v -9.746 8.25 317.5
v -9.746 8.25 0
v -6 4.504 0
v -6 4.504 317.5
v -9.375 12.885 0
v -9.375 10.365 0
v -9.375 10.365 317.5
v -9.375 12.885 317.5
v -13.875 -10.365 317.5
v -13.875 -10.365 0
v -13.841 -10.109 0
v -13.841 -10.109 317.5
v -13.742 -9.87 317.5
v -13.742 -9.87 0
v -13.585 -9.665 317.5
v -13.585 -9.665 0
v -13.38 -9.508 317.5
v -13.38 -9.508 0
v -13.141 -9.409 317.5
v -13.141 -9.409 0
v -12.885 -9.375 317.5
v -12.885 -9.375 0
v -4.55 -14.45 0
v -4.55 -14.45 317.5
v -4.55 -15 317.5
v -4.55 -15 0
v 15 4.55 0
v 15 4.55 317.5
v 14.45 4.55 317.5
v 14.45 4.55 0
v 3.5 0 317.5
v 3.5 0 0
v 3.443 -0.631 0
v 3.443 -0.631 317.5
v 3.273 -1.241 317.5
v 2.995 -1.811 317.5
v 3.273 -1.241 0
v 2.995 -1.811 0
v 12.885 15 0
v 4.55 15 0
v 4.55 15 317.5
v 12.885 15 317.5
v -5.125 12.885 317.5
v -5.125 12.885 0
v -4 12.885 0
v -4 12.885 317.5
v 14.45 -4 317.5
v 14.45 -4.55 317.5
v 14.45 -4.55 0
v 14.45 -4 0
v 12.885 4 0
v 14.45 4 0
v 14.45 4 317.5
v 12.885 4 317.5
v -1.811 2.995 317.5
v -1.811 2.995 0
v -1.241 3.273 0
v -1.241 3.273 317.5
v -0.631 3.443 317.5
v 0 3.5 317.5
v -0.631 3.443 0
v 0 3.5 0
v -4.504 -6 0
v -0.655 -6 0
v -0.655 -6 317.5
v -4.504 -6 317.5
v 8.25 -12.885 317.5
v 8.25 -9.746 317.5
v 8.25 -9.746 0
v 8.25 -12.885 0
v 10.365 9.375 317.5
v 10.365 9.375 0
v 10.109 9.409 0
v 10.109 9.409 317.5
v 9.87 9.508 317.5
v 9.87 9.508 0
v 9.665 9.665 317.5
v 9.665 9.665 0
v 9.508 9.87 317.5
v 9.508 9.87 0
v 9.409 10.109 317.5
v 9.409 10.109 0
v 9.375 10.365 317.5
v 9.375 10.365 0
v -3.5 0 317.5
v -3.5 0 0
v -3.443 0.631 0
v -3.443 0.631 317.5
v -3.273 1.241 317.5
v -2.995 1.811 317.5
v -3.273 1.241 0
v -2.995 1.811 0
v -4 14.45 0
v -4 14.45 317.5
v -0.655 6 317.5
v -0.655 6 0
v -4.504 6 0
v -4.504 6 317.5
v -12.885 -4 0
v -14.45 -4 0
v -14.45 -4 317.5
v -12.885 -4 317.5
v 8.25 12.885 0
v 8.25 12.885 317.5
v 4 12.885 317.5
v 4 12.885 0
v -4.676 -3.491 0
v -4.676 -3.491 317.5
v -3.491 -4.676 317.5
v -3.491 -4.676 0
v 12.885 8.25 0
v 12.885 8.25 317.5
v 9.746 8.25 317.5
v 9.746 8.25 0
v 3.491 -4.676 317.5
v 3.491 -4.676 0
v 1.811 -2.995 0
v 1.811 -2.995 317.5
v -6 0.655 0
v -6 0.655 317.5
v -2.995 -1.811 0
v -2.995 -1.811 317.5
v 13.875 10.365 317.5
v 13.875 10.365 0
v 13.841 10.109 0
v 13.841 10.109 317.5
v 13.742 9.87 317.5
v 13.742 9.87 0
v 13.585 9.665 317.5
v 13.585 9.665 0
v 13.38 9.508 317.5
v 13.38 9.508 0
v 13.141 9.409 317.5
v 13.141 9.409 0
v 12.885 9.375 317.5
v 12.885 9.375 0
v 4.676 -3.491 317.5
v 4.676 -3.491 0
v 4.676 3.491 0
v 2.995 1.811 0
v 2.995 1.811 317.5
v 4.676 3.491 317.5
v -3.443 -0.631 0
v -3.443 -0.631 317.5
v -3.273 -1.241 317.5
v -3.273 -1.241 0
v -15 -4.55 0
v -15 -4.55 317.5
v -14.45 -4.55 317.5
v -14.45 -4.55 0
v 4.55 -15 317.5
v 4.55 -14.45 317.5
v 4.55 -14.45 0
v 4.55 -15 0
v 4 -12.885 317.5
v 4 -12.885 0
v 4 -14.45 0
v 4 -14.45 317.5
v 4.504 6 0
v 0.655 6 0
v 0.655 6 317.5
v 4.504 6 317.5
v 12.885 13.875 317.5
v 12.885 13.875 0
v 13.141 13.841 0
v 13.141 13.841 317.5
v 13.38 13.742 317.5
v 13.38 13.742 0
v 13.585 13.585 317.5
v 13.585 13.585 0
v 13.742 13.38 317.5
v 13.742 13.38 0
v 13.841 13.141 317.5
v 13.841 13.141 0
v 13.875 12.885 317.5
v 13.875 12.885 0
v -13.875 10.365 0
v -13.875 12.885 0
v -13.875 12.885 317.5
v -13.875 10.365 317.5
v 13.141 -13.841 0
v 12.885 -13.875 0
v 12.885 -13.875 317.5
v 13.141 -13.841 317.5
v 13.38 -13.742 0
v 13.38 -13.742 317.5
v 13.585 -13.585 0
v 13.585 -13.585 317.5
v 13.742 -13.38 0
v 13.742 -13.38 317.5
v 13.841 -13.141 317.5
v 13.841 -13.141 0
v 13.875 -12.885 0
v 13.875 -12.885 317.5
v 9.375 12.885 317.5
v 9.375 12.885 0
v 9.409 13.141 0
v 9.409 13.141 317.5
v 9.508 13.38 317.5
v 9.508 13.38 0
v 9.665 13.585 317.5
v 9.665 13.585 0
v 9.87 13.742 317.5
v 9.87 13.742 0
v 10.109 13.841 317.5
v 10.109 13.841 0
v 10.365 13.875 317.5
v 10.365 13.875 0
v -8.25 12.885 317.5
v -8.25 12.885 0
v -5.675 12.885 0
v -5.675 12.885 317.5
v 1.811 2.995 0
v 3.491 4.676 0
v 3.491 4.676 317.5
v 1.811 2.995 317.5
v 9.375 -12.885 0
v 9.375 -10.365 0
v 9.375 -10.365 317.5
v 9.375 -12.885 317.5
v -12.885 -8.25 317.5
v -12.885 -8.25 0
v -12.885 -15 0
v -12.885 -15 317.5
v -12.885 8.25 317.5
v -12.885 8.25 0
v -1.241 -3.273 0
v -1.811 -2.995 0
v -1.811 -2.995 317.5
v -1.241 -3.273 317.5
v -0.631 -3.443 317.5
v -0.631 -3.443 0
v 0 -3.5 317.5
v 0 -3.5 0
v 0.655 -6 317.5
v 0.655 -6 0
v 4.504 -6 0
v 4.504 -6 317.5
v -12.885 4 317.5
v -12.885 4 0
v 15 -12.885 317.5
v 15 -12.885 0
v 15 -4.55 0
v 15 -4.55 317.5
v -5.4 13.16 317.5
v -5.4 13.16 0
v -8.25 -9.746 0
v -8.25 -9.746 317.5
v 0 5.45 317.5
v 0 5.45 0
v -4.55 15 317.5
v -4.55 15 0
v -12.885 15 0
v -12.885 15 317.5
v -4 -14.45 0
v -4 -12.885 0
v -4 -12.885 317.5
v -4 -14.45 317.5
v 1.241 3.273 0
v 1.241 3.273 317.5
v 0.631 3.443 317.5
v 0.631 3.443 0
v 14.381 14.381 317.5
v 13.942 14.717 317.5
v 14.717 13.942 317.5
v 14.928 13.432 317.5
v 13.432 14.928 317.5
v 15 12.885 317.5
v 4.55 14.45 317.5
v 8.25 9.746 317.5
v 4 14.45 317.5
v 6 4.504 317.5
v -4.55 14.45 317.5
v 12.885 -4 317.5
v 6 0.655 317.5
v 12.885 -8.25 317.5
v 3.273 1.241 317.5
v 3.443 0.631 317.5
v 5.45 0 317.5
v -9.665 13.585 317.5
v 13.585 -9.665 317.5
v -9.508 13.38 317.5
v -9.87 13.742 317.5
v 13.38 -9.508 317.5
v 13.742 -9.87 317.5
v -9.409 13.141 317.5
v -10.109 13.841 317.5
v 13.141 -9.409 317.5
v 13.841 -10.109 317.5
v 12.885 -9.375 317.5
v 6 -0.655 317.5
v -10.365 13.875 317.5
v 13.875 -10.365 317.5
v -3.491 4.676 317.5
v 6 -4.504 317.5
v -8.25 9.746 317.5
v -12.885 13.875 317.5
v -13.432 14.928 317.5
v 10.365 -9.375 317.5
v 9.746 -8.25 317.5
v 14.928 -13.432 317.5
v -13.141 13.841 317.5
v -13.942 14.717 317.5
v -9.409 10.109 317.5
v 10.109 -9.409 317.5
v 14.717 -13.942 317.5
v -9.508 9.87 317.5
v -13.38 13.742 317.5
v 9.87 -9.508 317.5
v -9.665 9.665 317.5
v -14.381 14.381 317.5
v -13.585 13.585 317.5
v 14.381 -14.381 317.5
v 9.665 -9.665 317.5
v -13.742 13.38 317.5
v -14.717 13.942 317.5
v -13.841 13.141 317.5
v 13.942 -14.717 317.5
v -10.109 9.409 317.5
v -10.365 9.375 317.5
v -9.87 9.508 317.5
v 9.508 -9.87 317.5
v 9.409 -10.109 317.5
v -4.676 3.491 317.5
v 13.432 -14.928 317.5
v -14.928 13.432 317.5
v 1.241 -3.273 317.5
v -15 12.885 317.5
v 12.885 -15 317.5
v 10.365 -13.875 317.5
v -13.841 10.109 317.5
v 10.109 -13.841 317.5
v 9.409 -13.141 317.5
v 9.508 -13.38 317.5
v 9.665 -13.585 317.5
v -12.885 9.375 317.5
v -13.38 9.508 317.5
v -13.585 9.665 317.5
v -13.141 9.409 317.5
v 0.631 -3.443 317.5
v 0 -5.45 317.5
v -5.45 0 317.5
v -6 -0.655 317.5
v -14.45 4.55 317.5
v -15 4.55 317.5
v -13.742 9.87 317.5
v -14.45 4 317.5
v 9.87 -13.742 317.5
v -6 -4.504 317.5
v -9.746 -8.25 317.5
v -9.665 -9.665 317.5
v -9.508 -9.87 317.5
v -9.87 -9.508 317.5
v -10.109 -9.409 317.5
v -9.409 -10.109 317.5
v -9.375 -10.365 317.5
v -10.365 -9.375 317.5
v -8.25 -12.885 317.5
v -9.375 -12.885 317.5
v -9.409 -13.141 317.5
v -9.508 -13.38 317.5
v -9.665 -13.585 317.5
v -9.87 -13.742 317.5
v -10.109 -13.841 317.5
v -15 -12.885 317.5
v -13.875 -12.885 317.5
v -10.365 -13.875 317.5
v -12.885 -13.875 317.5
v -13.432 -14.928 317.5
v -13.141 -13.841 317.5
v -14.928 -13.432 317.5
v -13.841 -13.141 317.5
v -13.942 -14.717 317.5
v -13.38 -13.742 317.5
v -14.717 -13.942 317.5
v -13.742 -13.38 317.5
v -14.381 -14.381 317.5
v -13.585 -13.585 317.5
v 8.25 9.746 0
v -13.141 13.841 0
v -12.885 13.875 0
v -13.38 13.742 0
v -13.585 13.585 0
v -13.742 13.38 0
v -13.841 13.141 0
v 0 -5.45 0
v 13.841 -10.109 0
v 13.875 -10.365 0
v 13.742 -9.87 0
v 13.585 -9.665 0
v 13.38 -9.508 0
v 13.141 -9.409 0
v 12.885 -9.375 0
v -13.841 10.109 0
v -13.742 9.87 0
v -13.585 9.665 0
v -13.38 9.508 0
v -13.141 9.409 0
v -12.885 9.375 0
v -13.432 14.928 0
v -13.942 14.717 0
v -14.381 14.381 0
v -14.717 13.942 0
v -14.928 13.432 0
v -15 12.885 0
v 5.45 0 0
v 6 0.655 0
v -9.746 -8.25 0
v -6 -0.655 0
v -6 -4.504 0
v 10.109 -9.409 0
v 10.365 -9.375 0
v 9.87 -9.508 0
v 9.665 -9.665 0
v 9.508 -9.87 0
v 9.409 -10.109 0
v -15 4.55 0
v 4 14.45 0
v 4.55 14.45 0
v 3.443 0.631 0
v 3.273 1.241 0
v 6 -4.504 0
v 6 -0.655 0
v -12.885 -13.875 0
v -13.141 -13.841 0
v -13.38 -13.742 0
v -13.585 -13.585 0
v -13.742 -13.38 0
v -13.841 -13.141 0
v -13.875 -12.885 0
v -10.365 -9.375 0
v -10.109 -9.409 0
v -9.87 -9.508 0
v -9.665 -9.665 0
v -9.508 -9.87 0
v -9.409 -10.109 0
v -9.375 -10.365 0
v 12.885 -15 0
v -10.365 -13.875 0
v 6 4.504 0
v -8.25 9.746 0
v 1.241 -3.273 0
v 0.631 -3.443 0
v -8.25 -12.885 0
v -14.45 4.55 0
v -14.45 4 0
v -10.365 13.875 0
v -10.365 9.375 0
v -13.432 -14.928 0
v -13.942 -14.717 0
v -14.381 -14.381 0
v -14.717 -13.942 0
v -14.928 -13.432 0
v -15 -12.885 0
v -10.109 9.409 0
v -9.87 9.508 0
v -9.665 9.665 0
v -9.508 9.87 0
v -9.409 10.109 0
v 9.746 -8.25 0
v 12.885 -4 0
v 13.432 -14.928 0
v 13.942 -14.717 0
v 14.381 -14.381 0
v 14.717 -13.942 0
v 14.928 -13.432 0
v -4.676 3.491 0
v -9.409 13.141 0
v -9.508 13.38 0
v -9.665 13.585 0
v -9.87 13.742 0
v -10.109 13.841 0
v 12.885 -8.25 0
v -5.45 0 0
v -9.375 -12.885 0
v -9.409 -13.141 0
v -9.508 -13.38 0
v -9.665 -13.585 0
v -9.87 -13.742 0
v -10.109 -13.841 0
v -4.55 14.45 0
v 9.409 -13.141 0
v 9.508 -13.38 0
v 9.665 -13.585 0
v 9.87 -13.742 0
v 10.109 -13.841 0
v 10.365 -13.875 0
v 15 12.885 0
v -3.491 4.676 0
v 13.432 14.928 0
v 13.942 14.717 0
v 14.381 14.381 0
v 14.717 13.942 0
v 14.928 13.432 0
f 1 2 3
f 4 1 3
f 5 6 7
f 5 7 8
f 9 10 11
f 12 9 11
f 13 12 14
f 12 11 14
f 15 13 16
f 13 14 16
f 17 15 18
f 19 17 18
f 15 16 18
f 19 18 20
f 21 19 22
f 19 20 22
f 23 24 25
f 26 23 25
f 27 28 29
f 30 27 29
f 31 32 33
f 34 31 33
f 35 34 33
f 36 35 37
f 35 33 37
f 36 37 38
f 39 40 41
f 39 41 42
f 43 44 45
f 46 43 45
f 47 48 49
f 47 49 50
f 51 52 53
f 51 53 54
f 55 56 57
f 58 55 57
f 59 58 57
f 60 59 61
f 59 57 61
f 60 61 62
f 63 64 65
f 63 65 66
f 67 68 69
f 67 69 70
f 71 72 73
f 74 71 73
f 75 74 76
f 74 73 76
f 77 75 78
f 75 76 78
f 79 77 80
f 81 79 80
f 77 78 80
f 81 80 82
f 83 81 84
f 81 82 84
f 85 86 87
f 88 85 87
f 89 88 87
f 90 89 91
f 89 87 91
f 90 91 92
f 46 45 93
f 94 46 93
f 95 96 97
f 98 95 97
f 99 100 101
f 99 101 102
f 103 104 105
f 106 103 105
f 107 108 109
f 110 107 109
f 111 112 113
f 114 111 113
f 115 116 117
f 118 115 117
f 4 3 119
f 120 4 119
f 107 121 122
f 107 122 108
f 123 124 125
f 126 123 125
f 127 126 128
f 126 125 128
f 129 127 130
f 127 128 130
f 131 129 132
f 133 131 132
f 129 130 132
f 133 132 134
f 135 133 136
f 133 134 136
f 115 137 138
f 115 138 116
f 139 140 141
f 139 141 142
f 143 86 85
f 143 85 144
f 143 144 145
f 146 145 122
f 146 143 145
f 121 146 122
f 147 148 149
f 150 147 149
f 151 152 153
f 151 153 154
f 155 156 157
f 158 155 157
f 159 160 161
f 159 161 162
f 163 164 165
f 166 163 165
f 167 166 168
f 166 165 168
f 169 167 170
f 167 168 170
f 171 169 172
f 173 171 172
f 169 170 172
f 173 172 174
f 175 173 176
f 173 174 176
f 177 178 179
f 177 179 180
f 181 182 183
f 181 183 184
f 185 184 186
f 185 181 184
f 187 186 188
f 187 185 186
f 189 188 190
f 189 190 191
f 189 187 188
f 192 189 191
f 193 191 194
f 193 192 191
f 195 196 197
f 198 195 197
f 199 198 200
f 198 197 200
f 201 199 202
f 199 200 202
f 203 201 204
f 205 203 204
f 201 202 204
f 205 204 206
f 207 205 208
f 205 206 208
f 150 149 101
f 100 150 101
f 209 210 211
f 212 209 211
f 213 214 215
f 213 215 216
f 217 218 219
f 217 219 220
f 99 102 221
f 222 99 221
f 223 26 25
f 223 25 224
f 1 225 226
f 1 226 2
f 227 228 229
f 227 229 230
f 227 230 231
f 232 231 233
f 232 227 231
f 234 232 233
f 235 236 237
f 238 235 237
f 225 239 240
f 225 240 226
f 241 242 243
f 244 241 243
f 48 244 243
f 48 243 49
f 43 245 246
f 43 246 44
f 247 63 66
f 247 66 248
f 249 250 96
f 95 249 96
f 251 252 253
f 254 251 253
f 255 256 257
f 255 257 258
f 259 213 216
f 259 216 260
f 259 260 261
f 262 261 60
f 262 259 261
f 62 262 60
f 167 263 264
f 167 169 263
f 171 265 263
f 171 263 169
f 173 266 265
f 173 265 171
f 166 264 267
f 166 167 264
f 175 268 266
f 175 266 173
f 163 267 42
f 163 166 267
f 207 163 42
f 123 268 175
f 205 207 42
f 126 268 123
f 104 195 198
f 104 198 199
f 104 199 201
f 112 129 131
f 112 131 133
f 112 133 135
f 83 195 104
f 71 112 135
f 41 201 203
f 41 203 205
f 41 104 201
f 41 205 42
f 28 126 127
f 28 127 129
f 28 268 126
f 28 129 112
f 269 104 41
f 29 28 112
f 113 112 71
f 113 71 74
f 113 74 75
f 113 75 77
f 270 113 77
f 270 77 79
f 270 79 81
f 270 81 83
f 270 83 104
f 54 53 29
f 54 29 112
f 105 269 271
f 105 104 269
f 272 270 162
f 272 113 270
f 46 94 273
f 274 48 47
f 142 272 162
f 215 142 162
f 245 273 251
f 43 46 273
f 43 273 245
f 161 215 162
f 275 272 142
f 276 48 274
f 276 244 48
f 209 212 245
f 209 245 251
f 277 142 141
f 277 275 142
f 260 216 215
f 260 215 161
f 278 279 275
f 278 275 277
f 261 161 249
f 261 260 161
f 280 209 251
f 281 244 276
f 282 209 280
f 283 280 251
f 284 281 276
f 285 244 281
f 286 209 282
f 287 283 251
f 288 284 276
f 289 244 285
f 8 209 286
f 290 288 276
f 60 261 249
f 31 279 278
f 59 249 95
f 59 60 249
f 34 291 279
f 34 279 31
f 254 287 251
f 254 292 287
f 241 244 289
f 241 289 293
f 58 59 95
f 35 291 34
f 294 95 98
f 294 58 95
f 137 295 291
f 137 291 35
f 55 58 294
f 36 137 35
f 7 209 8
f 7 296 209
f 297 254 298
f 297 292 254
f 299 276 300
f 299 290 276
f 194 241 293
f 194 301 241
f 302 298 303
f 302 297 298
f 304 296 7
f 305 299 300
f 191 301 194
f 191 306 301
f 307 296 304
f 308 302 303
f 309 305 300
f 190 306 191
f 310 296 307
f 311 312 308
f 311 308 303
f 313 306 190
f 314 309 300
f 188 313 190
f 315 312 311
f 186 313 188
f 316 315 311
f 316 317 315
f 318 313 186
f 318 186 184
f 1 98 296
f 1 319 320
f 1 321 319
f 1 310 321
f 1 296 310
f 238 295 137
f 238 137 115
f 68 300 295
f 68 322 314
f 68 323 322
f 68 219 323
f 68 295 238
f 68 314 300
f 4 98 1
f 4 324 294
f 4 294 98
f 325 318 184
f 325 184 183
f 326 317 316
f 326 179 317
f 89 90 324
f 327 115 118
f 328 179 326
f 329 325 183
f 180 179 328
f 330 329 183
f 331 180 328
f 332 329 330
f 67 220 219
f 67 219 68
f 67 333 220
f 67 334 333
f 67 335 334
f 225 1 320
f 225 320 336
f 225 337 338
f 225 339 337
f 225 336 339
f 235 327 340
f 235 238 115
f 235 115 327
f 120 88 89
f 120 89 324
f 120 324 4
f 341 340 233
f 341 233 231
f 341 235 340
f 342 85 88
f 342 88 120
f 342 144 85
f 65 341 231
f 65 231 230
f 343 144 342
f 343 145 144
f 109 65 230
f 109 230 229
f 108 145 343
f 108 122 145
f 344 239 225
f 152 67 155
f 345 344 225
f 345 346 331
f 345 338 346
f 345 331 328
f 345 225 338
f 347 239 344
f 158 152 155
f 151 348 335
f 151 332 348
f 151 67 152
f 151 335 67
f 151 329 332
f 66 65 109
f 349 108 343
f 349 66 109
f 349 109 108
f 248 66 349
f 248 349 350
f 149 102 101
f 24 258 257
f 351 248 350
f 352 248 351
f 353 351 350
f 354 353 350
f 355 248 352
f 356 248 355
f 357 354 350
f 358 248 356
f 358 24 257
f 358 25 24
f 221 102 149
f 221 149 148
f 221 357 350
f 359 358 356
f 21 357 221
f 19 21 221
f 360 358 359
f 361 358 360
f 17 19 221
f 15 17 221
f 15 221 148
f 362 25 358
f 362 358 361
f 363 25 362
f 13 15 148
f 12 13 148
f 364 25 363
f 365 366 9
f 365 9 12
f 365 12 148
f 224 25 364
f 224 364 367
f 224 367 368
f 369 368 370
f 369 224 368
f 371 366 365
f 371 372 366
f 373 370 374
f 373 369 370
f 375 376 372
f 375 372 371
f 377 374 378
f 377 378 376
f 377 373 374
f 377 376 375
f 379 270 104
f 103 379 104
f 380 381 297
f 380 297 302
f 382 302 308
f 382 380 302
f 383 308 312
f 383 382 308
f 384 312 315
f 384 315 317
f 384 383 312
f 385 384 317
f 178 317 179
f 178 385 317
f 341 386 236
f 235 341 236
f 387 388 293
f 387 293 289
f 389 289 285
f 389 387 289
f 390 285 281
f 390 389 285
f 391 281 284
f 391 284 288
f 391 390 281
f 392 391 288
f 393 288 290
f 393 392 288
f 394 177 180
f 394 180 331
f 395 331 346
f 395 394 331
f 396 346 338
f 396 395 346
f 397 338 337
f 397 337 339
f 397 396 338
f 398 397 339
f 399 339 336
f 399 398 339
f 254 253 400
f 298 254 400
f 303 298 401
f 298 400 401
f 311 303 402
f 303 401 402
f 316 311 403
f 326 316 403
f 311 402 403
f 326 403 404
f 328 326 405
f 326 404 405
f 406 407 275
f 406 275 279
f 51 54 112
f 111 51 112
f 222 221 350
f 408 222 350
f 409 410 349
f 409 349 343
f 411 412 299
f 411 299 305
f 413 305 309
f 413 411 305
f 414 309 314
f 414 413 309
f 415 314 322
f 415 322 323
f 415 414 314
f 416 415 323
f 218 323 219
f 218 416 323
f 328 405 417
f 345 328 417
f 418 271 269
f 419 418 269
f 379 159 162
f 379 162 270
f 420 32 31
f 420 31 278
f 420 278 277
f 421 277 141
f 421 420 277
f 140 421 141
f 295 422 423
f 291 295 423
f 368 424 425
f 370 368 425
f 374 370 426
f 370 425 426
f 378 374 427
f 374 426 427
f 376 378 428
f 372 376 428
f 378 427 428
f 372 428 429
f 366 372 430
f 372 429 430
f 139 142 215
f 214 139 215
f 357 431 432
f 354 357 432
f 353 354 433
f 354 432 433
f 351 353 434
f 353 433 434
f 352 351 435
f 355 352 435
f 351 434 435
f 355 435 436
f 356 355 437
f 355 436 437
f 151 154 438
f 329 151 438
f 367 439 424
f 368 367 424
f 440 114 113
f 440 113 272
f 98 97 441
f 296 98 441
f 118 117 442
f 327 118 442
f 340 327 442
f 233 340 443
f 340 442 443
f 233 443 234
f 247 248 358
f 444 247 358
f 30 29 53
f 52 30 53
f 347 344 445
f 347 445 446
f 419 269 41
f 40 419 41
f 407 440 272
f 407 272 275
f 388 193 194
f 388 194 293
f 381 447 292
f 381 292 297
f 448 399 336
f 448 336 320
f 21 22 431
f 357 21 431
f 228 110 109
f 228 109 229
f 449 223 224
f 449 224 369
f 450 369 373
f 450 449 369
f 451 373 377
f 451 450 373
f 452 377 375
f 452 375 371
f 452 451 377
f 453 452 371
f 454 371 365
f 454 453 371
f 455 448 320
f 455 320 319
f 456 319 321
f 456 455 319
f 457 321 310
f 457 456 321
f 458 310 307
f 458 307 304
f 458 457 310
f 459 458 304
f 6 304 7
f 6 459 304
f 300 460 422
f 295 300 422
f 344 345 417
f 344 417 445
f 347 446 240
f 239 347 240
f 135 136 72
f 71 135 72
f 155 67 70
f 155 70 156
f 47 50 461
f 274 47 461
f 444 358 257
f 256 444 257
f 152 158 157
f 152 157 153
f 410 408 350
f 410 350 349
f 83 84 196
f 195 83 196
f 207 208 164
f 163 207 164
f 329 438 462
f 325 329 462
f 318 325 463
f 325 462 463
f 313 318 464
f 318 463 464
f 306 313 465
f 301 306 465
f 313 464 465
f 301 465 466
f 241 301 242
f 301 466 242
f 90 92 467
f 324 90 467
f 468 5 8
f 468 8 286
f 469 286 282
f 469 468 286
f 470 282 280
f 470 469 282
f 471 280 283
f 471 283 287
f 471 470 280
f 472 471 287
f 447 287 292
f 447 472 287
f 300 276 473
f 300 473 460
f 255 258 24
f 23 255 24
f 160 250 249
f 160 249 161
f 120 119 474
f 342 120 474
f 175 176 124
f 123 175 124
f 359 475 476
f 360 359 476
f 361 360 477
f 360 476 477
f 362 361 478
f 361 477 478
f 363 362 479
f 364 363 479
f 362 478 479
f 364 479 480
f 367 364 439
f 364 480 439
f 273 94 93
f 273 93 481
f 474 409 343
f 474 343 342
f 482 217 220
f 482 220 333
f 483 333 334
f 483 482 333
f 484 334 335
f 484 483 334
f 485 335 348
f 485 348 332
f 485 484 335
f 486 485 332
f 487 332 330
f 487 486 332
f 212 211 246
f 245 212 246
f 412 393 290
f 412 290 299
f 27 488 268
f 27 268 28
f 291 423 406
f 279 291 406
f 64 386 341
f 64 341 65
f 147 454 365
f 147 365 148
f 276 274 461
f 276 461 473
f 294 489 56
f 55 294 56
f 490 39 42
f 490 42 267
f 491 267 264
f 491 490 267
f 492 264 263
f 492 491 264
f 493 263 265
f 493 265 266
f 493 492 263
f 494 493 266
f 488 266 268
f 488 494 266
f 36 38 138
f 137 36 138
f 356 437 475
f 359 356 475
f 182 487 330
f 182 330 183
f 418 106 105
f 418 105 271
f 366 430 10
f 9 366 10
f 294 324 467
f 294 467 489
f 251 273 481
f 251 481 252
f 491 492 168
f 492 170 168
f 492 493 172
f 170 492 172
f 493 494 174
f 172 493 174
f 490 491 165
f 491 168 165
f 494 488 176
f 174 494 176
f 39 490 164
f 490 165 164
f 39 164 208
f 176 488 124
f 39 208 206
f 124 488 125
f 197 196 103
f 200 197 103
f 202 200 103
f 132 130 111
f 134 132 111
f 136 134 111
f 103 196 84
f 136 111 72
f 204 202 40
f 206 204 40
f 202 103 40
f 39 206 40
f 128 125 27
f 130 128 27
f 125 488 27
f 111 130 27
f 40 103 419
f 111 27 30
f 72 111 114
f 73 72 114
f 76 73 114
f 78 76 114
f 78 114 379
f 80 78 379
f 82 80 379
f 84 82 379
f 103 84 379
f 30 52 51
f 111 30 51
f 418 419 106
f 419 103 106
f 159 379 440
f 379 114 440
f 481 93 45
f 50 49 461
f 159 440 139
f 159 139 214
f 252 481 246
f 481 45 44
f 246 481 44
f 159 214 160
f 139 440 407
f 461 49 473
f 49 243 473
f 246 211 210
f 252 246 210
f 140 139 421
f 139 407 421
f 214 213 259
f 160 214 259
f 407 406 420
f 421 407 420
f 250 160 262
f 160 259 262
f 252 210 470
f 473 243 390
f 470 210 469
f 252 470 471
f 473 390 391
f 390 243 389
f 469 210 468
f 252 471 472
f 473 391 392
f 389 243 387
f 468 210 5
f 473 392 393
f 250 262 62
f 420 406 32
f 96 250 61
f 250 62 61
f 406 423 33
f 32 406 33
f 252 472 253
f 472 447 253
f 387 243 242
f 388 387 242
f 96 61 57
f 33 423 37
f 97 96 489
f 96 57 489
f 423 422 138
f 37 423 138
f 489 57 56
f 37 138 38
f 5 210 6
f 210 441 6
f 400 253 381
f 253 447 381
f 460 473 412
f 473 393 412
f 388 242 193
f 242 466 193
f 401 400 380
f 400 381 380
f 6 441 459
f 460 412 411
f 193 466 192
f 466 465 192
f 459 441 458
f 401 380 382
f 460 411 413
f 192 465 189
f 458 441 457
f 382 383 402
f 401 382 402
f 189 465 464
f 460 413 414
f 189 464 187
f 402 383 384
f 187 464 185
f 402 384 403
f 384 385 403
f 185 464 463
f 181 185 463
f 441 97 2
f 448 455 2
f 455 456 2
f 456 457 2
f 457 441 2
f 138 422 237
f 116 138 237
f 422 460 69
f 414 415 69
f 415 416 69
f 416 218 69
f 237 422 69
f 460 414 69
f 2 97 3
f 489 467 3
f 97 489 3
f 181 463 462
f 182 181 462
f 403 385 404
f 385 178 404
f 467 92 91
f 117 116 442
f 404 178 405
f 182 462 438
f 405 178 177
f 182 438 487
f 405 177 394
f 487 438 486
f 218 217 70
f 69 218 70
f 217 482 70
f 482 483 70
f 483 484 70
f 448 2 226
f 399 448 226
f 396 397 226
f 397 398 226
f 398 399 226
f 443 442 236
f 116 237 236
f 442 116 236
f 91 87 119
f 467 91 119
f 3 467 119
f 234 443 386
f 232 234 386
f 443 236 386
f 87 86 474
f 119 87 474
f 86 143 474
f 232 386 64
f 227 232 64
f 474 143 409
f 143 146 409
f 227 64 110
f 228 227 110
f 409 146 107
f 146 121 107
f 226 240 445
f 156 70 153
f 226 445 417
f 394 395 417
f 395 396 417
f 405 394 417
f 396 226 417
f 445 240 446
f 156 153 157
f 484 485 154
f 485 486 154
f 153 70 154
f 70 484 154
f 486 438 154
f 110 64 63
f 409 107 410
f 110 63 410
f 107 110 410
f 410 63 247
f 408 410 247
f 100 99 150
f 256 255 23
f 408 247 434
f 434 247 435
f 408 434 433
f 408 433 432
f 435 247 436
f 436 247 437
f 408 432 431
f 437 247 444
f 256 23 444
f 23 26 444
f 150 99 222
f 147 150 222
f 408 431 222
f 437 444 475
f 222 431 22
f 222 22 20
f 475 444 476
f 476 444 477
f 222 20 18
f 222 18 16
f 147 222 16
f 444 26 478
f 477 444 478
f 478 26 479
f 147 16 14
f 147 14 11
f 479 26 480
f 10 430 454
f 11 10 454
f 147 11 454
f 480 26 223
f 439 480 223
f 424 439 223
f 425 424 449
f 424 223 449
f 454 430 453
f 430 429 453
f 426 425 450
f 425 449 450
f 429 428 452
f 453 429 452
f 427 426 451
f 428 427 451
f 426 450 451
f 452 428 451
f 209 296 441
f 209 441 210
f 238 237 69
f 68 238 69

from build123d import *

# Parameters (mm, degrees)
BOSS_EXTRUDE1_DEPTH     = 317.5
CUT_EXTRUDE1_DEPTH      = 1
CUT_EXTRUDE1_DEPTH_BACK = 318.5


with BuildPart() as part:
    # Sketch4 → Boss-Extrude1 (new body)
    with BuildSketch(Plane.XY):
        with BuildLine():
            Line((0, -5.45), (0.655464476, -6))
            Line((0.655464476, -6), (4.504469158, -6))
            Line((4.504469158, -6), (8.25, -9.745530842))
            Line((8.25, -9.745530842), (8.25, -12.885))
            Line((8.25, -12.885), (4, -12.885))
            Line((4, -12.885), (4, -14.45))
            Line((4, -14.45), (4.55, -14.45))
            Line((4.55, -14.45), (4.55, -15))
            Line((4.55, -15), (12.885, -15))
            ThreePointArc((12.885, -15), (14.380530842, -14.380530842), (15, -12.885))
            Line((15, -12.885), (15, -4.55))
            Line((15, -4.55), (14.45, -4.55))
            Line((14.45, -4.55), (14.45, -4))
            Line((14.45, -4), (12.885, -4))
            Line((12.885, -4), (12.885, -8.25))
            Line((12.885, -8.25), (9.745530842, -8.25))
            Line((9.745530842, -8.25), (6, -4.504469158))
            Line((6, -4.504469158), (6, -0.655464476))
            Line((6, -0.655464476), (5.45, 0))
            Line((5.45, 0), (3.5, 0))
            ThreePointArc((3.5, 0), (3.371433308, -0.939913534), (2.995178599, -1.81077474))
            Line((2.995178599, -1.81077474), (4.675743591, -3.491339732))
            Line((4.675743591, -3.491339732), (3.491339732, -4.675743591))
            Line((3.491339732, -4.675743591), (1.81077474, -2.995178599))
            ThreePointArc((1.81077474, -2.995178599), (0.939913534, -3.371433308), (0, -3.5))
            Line((0, -3.5), (0, -5.45))
        make_face()
        with BuildLine():
            Line((9.375, -10.365), (9.375, -12.885))
            ThreePointArc((9.375, -12.885), (9.664964287, -13.585035713), (10.365, -13.875))
            Line((10.365, -13.875), (12.885, -13.875))
            ThreePointArc((12.885, -13.875), (13.585035713, -13.585035713), (13.875, -12.885))
            Line((13.875, -12.885), (13.875, -10.365))
            ThreePointArc((13.875, -10.365), (13.585035713, -9.664964287), (12.885, -9.375))
            Line((12.885, -9.375), (10.365, -9.375))
            ThreePointArc((10.365, -9.375), (9.664964287, -9.664964287), (9.375, -10.365))
        make_face(mode=Mode.SUBTRACT)
    extrude(amount=BOSS_EXTRUDE1_DEPTH)

    # Mirror1: part across plane


with BuildPart() as part_1:
    add(part.part)
    add(part.part.mirror(Plane(origin=(0, 0, 0), x_dir=(0, 0, 1), z_dir=(1, 0, 0))))

    # Mirror2: part across plane


with BuildPart() as part_2:
    add(part_1.part)
    add(part_1.part.mirror(Plane.ZX))

    # Sketch5 → Cut-Extrude1 (cut, two sides)
    with BuildSketch(Plane.XY.offset(317.5)) as cut_extrude1_sk:
        Polygon((-5.675, 12.885), (-5.4, 13.16), (-5.125, 12.885), align=None)
    extrude(amount=CUT_EXTRUDE1_DEPTH, mode=Mode.SUBTRACT)
    extrude(cut_extrude1_sk.sketch, amount=-CUT_EXTRUDE1_DEPTH_BACK, mode=Mode.SUBTRACT)


solid = part_2.part
